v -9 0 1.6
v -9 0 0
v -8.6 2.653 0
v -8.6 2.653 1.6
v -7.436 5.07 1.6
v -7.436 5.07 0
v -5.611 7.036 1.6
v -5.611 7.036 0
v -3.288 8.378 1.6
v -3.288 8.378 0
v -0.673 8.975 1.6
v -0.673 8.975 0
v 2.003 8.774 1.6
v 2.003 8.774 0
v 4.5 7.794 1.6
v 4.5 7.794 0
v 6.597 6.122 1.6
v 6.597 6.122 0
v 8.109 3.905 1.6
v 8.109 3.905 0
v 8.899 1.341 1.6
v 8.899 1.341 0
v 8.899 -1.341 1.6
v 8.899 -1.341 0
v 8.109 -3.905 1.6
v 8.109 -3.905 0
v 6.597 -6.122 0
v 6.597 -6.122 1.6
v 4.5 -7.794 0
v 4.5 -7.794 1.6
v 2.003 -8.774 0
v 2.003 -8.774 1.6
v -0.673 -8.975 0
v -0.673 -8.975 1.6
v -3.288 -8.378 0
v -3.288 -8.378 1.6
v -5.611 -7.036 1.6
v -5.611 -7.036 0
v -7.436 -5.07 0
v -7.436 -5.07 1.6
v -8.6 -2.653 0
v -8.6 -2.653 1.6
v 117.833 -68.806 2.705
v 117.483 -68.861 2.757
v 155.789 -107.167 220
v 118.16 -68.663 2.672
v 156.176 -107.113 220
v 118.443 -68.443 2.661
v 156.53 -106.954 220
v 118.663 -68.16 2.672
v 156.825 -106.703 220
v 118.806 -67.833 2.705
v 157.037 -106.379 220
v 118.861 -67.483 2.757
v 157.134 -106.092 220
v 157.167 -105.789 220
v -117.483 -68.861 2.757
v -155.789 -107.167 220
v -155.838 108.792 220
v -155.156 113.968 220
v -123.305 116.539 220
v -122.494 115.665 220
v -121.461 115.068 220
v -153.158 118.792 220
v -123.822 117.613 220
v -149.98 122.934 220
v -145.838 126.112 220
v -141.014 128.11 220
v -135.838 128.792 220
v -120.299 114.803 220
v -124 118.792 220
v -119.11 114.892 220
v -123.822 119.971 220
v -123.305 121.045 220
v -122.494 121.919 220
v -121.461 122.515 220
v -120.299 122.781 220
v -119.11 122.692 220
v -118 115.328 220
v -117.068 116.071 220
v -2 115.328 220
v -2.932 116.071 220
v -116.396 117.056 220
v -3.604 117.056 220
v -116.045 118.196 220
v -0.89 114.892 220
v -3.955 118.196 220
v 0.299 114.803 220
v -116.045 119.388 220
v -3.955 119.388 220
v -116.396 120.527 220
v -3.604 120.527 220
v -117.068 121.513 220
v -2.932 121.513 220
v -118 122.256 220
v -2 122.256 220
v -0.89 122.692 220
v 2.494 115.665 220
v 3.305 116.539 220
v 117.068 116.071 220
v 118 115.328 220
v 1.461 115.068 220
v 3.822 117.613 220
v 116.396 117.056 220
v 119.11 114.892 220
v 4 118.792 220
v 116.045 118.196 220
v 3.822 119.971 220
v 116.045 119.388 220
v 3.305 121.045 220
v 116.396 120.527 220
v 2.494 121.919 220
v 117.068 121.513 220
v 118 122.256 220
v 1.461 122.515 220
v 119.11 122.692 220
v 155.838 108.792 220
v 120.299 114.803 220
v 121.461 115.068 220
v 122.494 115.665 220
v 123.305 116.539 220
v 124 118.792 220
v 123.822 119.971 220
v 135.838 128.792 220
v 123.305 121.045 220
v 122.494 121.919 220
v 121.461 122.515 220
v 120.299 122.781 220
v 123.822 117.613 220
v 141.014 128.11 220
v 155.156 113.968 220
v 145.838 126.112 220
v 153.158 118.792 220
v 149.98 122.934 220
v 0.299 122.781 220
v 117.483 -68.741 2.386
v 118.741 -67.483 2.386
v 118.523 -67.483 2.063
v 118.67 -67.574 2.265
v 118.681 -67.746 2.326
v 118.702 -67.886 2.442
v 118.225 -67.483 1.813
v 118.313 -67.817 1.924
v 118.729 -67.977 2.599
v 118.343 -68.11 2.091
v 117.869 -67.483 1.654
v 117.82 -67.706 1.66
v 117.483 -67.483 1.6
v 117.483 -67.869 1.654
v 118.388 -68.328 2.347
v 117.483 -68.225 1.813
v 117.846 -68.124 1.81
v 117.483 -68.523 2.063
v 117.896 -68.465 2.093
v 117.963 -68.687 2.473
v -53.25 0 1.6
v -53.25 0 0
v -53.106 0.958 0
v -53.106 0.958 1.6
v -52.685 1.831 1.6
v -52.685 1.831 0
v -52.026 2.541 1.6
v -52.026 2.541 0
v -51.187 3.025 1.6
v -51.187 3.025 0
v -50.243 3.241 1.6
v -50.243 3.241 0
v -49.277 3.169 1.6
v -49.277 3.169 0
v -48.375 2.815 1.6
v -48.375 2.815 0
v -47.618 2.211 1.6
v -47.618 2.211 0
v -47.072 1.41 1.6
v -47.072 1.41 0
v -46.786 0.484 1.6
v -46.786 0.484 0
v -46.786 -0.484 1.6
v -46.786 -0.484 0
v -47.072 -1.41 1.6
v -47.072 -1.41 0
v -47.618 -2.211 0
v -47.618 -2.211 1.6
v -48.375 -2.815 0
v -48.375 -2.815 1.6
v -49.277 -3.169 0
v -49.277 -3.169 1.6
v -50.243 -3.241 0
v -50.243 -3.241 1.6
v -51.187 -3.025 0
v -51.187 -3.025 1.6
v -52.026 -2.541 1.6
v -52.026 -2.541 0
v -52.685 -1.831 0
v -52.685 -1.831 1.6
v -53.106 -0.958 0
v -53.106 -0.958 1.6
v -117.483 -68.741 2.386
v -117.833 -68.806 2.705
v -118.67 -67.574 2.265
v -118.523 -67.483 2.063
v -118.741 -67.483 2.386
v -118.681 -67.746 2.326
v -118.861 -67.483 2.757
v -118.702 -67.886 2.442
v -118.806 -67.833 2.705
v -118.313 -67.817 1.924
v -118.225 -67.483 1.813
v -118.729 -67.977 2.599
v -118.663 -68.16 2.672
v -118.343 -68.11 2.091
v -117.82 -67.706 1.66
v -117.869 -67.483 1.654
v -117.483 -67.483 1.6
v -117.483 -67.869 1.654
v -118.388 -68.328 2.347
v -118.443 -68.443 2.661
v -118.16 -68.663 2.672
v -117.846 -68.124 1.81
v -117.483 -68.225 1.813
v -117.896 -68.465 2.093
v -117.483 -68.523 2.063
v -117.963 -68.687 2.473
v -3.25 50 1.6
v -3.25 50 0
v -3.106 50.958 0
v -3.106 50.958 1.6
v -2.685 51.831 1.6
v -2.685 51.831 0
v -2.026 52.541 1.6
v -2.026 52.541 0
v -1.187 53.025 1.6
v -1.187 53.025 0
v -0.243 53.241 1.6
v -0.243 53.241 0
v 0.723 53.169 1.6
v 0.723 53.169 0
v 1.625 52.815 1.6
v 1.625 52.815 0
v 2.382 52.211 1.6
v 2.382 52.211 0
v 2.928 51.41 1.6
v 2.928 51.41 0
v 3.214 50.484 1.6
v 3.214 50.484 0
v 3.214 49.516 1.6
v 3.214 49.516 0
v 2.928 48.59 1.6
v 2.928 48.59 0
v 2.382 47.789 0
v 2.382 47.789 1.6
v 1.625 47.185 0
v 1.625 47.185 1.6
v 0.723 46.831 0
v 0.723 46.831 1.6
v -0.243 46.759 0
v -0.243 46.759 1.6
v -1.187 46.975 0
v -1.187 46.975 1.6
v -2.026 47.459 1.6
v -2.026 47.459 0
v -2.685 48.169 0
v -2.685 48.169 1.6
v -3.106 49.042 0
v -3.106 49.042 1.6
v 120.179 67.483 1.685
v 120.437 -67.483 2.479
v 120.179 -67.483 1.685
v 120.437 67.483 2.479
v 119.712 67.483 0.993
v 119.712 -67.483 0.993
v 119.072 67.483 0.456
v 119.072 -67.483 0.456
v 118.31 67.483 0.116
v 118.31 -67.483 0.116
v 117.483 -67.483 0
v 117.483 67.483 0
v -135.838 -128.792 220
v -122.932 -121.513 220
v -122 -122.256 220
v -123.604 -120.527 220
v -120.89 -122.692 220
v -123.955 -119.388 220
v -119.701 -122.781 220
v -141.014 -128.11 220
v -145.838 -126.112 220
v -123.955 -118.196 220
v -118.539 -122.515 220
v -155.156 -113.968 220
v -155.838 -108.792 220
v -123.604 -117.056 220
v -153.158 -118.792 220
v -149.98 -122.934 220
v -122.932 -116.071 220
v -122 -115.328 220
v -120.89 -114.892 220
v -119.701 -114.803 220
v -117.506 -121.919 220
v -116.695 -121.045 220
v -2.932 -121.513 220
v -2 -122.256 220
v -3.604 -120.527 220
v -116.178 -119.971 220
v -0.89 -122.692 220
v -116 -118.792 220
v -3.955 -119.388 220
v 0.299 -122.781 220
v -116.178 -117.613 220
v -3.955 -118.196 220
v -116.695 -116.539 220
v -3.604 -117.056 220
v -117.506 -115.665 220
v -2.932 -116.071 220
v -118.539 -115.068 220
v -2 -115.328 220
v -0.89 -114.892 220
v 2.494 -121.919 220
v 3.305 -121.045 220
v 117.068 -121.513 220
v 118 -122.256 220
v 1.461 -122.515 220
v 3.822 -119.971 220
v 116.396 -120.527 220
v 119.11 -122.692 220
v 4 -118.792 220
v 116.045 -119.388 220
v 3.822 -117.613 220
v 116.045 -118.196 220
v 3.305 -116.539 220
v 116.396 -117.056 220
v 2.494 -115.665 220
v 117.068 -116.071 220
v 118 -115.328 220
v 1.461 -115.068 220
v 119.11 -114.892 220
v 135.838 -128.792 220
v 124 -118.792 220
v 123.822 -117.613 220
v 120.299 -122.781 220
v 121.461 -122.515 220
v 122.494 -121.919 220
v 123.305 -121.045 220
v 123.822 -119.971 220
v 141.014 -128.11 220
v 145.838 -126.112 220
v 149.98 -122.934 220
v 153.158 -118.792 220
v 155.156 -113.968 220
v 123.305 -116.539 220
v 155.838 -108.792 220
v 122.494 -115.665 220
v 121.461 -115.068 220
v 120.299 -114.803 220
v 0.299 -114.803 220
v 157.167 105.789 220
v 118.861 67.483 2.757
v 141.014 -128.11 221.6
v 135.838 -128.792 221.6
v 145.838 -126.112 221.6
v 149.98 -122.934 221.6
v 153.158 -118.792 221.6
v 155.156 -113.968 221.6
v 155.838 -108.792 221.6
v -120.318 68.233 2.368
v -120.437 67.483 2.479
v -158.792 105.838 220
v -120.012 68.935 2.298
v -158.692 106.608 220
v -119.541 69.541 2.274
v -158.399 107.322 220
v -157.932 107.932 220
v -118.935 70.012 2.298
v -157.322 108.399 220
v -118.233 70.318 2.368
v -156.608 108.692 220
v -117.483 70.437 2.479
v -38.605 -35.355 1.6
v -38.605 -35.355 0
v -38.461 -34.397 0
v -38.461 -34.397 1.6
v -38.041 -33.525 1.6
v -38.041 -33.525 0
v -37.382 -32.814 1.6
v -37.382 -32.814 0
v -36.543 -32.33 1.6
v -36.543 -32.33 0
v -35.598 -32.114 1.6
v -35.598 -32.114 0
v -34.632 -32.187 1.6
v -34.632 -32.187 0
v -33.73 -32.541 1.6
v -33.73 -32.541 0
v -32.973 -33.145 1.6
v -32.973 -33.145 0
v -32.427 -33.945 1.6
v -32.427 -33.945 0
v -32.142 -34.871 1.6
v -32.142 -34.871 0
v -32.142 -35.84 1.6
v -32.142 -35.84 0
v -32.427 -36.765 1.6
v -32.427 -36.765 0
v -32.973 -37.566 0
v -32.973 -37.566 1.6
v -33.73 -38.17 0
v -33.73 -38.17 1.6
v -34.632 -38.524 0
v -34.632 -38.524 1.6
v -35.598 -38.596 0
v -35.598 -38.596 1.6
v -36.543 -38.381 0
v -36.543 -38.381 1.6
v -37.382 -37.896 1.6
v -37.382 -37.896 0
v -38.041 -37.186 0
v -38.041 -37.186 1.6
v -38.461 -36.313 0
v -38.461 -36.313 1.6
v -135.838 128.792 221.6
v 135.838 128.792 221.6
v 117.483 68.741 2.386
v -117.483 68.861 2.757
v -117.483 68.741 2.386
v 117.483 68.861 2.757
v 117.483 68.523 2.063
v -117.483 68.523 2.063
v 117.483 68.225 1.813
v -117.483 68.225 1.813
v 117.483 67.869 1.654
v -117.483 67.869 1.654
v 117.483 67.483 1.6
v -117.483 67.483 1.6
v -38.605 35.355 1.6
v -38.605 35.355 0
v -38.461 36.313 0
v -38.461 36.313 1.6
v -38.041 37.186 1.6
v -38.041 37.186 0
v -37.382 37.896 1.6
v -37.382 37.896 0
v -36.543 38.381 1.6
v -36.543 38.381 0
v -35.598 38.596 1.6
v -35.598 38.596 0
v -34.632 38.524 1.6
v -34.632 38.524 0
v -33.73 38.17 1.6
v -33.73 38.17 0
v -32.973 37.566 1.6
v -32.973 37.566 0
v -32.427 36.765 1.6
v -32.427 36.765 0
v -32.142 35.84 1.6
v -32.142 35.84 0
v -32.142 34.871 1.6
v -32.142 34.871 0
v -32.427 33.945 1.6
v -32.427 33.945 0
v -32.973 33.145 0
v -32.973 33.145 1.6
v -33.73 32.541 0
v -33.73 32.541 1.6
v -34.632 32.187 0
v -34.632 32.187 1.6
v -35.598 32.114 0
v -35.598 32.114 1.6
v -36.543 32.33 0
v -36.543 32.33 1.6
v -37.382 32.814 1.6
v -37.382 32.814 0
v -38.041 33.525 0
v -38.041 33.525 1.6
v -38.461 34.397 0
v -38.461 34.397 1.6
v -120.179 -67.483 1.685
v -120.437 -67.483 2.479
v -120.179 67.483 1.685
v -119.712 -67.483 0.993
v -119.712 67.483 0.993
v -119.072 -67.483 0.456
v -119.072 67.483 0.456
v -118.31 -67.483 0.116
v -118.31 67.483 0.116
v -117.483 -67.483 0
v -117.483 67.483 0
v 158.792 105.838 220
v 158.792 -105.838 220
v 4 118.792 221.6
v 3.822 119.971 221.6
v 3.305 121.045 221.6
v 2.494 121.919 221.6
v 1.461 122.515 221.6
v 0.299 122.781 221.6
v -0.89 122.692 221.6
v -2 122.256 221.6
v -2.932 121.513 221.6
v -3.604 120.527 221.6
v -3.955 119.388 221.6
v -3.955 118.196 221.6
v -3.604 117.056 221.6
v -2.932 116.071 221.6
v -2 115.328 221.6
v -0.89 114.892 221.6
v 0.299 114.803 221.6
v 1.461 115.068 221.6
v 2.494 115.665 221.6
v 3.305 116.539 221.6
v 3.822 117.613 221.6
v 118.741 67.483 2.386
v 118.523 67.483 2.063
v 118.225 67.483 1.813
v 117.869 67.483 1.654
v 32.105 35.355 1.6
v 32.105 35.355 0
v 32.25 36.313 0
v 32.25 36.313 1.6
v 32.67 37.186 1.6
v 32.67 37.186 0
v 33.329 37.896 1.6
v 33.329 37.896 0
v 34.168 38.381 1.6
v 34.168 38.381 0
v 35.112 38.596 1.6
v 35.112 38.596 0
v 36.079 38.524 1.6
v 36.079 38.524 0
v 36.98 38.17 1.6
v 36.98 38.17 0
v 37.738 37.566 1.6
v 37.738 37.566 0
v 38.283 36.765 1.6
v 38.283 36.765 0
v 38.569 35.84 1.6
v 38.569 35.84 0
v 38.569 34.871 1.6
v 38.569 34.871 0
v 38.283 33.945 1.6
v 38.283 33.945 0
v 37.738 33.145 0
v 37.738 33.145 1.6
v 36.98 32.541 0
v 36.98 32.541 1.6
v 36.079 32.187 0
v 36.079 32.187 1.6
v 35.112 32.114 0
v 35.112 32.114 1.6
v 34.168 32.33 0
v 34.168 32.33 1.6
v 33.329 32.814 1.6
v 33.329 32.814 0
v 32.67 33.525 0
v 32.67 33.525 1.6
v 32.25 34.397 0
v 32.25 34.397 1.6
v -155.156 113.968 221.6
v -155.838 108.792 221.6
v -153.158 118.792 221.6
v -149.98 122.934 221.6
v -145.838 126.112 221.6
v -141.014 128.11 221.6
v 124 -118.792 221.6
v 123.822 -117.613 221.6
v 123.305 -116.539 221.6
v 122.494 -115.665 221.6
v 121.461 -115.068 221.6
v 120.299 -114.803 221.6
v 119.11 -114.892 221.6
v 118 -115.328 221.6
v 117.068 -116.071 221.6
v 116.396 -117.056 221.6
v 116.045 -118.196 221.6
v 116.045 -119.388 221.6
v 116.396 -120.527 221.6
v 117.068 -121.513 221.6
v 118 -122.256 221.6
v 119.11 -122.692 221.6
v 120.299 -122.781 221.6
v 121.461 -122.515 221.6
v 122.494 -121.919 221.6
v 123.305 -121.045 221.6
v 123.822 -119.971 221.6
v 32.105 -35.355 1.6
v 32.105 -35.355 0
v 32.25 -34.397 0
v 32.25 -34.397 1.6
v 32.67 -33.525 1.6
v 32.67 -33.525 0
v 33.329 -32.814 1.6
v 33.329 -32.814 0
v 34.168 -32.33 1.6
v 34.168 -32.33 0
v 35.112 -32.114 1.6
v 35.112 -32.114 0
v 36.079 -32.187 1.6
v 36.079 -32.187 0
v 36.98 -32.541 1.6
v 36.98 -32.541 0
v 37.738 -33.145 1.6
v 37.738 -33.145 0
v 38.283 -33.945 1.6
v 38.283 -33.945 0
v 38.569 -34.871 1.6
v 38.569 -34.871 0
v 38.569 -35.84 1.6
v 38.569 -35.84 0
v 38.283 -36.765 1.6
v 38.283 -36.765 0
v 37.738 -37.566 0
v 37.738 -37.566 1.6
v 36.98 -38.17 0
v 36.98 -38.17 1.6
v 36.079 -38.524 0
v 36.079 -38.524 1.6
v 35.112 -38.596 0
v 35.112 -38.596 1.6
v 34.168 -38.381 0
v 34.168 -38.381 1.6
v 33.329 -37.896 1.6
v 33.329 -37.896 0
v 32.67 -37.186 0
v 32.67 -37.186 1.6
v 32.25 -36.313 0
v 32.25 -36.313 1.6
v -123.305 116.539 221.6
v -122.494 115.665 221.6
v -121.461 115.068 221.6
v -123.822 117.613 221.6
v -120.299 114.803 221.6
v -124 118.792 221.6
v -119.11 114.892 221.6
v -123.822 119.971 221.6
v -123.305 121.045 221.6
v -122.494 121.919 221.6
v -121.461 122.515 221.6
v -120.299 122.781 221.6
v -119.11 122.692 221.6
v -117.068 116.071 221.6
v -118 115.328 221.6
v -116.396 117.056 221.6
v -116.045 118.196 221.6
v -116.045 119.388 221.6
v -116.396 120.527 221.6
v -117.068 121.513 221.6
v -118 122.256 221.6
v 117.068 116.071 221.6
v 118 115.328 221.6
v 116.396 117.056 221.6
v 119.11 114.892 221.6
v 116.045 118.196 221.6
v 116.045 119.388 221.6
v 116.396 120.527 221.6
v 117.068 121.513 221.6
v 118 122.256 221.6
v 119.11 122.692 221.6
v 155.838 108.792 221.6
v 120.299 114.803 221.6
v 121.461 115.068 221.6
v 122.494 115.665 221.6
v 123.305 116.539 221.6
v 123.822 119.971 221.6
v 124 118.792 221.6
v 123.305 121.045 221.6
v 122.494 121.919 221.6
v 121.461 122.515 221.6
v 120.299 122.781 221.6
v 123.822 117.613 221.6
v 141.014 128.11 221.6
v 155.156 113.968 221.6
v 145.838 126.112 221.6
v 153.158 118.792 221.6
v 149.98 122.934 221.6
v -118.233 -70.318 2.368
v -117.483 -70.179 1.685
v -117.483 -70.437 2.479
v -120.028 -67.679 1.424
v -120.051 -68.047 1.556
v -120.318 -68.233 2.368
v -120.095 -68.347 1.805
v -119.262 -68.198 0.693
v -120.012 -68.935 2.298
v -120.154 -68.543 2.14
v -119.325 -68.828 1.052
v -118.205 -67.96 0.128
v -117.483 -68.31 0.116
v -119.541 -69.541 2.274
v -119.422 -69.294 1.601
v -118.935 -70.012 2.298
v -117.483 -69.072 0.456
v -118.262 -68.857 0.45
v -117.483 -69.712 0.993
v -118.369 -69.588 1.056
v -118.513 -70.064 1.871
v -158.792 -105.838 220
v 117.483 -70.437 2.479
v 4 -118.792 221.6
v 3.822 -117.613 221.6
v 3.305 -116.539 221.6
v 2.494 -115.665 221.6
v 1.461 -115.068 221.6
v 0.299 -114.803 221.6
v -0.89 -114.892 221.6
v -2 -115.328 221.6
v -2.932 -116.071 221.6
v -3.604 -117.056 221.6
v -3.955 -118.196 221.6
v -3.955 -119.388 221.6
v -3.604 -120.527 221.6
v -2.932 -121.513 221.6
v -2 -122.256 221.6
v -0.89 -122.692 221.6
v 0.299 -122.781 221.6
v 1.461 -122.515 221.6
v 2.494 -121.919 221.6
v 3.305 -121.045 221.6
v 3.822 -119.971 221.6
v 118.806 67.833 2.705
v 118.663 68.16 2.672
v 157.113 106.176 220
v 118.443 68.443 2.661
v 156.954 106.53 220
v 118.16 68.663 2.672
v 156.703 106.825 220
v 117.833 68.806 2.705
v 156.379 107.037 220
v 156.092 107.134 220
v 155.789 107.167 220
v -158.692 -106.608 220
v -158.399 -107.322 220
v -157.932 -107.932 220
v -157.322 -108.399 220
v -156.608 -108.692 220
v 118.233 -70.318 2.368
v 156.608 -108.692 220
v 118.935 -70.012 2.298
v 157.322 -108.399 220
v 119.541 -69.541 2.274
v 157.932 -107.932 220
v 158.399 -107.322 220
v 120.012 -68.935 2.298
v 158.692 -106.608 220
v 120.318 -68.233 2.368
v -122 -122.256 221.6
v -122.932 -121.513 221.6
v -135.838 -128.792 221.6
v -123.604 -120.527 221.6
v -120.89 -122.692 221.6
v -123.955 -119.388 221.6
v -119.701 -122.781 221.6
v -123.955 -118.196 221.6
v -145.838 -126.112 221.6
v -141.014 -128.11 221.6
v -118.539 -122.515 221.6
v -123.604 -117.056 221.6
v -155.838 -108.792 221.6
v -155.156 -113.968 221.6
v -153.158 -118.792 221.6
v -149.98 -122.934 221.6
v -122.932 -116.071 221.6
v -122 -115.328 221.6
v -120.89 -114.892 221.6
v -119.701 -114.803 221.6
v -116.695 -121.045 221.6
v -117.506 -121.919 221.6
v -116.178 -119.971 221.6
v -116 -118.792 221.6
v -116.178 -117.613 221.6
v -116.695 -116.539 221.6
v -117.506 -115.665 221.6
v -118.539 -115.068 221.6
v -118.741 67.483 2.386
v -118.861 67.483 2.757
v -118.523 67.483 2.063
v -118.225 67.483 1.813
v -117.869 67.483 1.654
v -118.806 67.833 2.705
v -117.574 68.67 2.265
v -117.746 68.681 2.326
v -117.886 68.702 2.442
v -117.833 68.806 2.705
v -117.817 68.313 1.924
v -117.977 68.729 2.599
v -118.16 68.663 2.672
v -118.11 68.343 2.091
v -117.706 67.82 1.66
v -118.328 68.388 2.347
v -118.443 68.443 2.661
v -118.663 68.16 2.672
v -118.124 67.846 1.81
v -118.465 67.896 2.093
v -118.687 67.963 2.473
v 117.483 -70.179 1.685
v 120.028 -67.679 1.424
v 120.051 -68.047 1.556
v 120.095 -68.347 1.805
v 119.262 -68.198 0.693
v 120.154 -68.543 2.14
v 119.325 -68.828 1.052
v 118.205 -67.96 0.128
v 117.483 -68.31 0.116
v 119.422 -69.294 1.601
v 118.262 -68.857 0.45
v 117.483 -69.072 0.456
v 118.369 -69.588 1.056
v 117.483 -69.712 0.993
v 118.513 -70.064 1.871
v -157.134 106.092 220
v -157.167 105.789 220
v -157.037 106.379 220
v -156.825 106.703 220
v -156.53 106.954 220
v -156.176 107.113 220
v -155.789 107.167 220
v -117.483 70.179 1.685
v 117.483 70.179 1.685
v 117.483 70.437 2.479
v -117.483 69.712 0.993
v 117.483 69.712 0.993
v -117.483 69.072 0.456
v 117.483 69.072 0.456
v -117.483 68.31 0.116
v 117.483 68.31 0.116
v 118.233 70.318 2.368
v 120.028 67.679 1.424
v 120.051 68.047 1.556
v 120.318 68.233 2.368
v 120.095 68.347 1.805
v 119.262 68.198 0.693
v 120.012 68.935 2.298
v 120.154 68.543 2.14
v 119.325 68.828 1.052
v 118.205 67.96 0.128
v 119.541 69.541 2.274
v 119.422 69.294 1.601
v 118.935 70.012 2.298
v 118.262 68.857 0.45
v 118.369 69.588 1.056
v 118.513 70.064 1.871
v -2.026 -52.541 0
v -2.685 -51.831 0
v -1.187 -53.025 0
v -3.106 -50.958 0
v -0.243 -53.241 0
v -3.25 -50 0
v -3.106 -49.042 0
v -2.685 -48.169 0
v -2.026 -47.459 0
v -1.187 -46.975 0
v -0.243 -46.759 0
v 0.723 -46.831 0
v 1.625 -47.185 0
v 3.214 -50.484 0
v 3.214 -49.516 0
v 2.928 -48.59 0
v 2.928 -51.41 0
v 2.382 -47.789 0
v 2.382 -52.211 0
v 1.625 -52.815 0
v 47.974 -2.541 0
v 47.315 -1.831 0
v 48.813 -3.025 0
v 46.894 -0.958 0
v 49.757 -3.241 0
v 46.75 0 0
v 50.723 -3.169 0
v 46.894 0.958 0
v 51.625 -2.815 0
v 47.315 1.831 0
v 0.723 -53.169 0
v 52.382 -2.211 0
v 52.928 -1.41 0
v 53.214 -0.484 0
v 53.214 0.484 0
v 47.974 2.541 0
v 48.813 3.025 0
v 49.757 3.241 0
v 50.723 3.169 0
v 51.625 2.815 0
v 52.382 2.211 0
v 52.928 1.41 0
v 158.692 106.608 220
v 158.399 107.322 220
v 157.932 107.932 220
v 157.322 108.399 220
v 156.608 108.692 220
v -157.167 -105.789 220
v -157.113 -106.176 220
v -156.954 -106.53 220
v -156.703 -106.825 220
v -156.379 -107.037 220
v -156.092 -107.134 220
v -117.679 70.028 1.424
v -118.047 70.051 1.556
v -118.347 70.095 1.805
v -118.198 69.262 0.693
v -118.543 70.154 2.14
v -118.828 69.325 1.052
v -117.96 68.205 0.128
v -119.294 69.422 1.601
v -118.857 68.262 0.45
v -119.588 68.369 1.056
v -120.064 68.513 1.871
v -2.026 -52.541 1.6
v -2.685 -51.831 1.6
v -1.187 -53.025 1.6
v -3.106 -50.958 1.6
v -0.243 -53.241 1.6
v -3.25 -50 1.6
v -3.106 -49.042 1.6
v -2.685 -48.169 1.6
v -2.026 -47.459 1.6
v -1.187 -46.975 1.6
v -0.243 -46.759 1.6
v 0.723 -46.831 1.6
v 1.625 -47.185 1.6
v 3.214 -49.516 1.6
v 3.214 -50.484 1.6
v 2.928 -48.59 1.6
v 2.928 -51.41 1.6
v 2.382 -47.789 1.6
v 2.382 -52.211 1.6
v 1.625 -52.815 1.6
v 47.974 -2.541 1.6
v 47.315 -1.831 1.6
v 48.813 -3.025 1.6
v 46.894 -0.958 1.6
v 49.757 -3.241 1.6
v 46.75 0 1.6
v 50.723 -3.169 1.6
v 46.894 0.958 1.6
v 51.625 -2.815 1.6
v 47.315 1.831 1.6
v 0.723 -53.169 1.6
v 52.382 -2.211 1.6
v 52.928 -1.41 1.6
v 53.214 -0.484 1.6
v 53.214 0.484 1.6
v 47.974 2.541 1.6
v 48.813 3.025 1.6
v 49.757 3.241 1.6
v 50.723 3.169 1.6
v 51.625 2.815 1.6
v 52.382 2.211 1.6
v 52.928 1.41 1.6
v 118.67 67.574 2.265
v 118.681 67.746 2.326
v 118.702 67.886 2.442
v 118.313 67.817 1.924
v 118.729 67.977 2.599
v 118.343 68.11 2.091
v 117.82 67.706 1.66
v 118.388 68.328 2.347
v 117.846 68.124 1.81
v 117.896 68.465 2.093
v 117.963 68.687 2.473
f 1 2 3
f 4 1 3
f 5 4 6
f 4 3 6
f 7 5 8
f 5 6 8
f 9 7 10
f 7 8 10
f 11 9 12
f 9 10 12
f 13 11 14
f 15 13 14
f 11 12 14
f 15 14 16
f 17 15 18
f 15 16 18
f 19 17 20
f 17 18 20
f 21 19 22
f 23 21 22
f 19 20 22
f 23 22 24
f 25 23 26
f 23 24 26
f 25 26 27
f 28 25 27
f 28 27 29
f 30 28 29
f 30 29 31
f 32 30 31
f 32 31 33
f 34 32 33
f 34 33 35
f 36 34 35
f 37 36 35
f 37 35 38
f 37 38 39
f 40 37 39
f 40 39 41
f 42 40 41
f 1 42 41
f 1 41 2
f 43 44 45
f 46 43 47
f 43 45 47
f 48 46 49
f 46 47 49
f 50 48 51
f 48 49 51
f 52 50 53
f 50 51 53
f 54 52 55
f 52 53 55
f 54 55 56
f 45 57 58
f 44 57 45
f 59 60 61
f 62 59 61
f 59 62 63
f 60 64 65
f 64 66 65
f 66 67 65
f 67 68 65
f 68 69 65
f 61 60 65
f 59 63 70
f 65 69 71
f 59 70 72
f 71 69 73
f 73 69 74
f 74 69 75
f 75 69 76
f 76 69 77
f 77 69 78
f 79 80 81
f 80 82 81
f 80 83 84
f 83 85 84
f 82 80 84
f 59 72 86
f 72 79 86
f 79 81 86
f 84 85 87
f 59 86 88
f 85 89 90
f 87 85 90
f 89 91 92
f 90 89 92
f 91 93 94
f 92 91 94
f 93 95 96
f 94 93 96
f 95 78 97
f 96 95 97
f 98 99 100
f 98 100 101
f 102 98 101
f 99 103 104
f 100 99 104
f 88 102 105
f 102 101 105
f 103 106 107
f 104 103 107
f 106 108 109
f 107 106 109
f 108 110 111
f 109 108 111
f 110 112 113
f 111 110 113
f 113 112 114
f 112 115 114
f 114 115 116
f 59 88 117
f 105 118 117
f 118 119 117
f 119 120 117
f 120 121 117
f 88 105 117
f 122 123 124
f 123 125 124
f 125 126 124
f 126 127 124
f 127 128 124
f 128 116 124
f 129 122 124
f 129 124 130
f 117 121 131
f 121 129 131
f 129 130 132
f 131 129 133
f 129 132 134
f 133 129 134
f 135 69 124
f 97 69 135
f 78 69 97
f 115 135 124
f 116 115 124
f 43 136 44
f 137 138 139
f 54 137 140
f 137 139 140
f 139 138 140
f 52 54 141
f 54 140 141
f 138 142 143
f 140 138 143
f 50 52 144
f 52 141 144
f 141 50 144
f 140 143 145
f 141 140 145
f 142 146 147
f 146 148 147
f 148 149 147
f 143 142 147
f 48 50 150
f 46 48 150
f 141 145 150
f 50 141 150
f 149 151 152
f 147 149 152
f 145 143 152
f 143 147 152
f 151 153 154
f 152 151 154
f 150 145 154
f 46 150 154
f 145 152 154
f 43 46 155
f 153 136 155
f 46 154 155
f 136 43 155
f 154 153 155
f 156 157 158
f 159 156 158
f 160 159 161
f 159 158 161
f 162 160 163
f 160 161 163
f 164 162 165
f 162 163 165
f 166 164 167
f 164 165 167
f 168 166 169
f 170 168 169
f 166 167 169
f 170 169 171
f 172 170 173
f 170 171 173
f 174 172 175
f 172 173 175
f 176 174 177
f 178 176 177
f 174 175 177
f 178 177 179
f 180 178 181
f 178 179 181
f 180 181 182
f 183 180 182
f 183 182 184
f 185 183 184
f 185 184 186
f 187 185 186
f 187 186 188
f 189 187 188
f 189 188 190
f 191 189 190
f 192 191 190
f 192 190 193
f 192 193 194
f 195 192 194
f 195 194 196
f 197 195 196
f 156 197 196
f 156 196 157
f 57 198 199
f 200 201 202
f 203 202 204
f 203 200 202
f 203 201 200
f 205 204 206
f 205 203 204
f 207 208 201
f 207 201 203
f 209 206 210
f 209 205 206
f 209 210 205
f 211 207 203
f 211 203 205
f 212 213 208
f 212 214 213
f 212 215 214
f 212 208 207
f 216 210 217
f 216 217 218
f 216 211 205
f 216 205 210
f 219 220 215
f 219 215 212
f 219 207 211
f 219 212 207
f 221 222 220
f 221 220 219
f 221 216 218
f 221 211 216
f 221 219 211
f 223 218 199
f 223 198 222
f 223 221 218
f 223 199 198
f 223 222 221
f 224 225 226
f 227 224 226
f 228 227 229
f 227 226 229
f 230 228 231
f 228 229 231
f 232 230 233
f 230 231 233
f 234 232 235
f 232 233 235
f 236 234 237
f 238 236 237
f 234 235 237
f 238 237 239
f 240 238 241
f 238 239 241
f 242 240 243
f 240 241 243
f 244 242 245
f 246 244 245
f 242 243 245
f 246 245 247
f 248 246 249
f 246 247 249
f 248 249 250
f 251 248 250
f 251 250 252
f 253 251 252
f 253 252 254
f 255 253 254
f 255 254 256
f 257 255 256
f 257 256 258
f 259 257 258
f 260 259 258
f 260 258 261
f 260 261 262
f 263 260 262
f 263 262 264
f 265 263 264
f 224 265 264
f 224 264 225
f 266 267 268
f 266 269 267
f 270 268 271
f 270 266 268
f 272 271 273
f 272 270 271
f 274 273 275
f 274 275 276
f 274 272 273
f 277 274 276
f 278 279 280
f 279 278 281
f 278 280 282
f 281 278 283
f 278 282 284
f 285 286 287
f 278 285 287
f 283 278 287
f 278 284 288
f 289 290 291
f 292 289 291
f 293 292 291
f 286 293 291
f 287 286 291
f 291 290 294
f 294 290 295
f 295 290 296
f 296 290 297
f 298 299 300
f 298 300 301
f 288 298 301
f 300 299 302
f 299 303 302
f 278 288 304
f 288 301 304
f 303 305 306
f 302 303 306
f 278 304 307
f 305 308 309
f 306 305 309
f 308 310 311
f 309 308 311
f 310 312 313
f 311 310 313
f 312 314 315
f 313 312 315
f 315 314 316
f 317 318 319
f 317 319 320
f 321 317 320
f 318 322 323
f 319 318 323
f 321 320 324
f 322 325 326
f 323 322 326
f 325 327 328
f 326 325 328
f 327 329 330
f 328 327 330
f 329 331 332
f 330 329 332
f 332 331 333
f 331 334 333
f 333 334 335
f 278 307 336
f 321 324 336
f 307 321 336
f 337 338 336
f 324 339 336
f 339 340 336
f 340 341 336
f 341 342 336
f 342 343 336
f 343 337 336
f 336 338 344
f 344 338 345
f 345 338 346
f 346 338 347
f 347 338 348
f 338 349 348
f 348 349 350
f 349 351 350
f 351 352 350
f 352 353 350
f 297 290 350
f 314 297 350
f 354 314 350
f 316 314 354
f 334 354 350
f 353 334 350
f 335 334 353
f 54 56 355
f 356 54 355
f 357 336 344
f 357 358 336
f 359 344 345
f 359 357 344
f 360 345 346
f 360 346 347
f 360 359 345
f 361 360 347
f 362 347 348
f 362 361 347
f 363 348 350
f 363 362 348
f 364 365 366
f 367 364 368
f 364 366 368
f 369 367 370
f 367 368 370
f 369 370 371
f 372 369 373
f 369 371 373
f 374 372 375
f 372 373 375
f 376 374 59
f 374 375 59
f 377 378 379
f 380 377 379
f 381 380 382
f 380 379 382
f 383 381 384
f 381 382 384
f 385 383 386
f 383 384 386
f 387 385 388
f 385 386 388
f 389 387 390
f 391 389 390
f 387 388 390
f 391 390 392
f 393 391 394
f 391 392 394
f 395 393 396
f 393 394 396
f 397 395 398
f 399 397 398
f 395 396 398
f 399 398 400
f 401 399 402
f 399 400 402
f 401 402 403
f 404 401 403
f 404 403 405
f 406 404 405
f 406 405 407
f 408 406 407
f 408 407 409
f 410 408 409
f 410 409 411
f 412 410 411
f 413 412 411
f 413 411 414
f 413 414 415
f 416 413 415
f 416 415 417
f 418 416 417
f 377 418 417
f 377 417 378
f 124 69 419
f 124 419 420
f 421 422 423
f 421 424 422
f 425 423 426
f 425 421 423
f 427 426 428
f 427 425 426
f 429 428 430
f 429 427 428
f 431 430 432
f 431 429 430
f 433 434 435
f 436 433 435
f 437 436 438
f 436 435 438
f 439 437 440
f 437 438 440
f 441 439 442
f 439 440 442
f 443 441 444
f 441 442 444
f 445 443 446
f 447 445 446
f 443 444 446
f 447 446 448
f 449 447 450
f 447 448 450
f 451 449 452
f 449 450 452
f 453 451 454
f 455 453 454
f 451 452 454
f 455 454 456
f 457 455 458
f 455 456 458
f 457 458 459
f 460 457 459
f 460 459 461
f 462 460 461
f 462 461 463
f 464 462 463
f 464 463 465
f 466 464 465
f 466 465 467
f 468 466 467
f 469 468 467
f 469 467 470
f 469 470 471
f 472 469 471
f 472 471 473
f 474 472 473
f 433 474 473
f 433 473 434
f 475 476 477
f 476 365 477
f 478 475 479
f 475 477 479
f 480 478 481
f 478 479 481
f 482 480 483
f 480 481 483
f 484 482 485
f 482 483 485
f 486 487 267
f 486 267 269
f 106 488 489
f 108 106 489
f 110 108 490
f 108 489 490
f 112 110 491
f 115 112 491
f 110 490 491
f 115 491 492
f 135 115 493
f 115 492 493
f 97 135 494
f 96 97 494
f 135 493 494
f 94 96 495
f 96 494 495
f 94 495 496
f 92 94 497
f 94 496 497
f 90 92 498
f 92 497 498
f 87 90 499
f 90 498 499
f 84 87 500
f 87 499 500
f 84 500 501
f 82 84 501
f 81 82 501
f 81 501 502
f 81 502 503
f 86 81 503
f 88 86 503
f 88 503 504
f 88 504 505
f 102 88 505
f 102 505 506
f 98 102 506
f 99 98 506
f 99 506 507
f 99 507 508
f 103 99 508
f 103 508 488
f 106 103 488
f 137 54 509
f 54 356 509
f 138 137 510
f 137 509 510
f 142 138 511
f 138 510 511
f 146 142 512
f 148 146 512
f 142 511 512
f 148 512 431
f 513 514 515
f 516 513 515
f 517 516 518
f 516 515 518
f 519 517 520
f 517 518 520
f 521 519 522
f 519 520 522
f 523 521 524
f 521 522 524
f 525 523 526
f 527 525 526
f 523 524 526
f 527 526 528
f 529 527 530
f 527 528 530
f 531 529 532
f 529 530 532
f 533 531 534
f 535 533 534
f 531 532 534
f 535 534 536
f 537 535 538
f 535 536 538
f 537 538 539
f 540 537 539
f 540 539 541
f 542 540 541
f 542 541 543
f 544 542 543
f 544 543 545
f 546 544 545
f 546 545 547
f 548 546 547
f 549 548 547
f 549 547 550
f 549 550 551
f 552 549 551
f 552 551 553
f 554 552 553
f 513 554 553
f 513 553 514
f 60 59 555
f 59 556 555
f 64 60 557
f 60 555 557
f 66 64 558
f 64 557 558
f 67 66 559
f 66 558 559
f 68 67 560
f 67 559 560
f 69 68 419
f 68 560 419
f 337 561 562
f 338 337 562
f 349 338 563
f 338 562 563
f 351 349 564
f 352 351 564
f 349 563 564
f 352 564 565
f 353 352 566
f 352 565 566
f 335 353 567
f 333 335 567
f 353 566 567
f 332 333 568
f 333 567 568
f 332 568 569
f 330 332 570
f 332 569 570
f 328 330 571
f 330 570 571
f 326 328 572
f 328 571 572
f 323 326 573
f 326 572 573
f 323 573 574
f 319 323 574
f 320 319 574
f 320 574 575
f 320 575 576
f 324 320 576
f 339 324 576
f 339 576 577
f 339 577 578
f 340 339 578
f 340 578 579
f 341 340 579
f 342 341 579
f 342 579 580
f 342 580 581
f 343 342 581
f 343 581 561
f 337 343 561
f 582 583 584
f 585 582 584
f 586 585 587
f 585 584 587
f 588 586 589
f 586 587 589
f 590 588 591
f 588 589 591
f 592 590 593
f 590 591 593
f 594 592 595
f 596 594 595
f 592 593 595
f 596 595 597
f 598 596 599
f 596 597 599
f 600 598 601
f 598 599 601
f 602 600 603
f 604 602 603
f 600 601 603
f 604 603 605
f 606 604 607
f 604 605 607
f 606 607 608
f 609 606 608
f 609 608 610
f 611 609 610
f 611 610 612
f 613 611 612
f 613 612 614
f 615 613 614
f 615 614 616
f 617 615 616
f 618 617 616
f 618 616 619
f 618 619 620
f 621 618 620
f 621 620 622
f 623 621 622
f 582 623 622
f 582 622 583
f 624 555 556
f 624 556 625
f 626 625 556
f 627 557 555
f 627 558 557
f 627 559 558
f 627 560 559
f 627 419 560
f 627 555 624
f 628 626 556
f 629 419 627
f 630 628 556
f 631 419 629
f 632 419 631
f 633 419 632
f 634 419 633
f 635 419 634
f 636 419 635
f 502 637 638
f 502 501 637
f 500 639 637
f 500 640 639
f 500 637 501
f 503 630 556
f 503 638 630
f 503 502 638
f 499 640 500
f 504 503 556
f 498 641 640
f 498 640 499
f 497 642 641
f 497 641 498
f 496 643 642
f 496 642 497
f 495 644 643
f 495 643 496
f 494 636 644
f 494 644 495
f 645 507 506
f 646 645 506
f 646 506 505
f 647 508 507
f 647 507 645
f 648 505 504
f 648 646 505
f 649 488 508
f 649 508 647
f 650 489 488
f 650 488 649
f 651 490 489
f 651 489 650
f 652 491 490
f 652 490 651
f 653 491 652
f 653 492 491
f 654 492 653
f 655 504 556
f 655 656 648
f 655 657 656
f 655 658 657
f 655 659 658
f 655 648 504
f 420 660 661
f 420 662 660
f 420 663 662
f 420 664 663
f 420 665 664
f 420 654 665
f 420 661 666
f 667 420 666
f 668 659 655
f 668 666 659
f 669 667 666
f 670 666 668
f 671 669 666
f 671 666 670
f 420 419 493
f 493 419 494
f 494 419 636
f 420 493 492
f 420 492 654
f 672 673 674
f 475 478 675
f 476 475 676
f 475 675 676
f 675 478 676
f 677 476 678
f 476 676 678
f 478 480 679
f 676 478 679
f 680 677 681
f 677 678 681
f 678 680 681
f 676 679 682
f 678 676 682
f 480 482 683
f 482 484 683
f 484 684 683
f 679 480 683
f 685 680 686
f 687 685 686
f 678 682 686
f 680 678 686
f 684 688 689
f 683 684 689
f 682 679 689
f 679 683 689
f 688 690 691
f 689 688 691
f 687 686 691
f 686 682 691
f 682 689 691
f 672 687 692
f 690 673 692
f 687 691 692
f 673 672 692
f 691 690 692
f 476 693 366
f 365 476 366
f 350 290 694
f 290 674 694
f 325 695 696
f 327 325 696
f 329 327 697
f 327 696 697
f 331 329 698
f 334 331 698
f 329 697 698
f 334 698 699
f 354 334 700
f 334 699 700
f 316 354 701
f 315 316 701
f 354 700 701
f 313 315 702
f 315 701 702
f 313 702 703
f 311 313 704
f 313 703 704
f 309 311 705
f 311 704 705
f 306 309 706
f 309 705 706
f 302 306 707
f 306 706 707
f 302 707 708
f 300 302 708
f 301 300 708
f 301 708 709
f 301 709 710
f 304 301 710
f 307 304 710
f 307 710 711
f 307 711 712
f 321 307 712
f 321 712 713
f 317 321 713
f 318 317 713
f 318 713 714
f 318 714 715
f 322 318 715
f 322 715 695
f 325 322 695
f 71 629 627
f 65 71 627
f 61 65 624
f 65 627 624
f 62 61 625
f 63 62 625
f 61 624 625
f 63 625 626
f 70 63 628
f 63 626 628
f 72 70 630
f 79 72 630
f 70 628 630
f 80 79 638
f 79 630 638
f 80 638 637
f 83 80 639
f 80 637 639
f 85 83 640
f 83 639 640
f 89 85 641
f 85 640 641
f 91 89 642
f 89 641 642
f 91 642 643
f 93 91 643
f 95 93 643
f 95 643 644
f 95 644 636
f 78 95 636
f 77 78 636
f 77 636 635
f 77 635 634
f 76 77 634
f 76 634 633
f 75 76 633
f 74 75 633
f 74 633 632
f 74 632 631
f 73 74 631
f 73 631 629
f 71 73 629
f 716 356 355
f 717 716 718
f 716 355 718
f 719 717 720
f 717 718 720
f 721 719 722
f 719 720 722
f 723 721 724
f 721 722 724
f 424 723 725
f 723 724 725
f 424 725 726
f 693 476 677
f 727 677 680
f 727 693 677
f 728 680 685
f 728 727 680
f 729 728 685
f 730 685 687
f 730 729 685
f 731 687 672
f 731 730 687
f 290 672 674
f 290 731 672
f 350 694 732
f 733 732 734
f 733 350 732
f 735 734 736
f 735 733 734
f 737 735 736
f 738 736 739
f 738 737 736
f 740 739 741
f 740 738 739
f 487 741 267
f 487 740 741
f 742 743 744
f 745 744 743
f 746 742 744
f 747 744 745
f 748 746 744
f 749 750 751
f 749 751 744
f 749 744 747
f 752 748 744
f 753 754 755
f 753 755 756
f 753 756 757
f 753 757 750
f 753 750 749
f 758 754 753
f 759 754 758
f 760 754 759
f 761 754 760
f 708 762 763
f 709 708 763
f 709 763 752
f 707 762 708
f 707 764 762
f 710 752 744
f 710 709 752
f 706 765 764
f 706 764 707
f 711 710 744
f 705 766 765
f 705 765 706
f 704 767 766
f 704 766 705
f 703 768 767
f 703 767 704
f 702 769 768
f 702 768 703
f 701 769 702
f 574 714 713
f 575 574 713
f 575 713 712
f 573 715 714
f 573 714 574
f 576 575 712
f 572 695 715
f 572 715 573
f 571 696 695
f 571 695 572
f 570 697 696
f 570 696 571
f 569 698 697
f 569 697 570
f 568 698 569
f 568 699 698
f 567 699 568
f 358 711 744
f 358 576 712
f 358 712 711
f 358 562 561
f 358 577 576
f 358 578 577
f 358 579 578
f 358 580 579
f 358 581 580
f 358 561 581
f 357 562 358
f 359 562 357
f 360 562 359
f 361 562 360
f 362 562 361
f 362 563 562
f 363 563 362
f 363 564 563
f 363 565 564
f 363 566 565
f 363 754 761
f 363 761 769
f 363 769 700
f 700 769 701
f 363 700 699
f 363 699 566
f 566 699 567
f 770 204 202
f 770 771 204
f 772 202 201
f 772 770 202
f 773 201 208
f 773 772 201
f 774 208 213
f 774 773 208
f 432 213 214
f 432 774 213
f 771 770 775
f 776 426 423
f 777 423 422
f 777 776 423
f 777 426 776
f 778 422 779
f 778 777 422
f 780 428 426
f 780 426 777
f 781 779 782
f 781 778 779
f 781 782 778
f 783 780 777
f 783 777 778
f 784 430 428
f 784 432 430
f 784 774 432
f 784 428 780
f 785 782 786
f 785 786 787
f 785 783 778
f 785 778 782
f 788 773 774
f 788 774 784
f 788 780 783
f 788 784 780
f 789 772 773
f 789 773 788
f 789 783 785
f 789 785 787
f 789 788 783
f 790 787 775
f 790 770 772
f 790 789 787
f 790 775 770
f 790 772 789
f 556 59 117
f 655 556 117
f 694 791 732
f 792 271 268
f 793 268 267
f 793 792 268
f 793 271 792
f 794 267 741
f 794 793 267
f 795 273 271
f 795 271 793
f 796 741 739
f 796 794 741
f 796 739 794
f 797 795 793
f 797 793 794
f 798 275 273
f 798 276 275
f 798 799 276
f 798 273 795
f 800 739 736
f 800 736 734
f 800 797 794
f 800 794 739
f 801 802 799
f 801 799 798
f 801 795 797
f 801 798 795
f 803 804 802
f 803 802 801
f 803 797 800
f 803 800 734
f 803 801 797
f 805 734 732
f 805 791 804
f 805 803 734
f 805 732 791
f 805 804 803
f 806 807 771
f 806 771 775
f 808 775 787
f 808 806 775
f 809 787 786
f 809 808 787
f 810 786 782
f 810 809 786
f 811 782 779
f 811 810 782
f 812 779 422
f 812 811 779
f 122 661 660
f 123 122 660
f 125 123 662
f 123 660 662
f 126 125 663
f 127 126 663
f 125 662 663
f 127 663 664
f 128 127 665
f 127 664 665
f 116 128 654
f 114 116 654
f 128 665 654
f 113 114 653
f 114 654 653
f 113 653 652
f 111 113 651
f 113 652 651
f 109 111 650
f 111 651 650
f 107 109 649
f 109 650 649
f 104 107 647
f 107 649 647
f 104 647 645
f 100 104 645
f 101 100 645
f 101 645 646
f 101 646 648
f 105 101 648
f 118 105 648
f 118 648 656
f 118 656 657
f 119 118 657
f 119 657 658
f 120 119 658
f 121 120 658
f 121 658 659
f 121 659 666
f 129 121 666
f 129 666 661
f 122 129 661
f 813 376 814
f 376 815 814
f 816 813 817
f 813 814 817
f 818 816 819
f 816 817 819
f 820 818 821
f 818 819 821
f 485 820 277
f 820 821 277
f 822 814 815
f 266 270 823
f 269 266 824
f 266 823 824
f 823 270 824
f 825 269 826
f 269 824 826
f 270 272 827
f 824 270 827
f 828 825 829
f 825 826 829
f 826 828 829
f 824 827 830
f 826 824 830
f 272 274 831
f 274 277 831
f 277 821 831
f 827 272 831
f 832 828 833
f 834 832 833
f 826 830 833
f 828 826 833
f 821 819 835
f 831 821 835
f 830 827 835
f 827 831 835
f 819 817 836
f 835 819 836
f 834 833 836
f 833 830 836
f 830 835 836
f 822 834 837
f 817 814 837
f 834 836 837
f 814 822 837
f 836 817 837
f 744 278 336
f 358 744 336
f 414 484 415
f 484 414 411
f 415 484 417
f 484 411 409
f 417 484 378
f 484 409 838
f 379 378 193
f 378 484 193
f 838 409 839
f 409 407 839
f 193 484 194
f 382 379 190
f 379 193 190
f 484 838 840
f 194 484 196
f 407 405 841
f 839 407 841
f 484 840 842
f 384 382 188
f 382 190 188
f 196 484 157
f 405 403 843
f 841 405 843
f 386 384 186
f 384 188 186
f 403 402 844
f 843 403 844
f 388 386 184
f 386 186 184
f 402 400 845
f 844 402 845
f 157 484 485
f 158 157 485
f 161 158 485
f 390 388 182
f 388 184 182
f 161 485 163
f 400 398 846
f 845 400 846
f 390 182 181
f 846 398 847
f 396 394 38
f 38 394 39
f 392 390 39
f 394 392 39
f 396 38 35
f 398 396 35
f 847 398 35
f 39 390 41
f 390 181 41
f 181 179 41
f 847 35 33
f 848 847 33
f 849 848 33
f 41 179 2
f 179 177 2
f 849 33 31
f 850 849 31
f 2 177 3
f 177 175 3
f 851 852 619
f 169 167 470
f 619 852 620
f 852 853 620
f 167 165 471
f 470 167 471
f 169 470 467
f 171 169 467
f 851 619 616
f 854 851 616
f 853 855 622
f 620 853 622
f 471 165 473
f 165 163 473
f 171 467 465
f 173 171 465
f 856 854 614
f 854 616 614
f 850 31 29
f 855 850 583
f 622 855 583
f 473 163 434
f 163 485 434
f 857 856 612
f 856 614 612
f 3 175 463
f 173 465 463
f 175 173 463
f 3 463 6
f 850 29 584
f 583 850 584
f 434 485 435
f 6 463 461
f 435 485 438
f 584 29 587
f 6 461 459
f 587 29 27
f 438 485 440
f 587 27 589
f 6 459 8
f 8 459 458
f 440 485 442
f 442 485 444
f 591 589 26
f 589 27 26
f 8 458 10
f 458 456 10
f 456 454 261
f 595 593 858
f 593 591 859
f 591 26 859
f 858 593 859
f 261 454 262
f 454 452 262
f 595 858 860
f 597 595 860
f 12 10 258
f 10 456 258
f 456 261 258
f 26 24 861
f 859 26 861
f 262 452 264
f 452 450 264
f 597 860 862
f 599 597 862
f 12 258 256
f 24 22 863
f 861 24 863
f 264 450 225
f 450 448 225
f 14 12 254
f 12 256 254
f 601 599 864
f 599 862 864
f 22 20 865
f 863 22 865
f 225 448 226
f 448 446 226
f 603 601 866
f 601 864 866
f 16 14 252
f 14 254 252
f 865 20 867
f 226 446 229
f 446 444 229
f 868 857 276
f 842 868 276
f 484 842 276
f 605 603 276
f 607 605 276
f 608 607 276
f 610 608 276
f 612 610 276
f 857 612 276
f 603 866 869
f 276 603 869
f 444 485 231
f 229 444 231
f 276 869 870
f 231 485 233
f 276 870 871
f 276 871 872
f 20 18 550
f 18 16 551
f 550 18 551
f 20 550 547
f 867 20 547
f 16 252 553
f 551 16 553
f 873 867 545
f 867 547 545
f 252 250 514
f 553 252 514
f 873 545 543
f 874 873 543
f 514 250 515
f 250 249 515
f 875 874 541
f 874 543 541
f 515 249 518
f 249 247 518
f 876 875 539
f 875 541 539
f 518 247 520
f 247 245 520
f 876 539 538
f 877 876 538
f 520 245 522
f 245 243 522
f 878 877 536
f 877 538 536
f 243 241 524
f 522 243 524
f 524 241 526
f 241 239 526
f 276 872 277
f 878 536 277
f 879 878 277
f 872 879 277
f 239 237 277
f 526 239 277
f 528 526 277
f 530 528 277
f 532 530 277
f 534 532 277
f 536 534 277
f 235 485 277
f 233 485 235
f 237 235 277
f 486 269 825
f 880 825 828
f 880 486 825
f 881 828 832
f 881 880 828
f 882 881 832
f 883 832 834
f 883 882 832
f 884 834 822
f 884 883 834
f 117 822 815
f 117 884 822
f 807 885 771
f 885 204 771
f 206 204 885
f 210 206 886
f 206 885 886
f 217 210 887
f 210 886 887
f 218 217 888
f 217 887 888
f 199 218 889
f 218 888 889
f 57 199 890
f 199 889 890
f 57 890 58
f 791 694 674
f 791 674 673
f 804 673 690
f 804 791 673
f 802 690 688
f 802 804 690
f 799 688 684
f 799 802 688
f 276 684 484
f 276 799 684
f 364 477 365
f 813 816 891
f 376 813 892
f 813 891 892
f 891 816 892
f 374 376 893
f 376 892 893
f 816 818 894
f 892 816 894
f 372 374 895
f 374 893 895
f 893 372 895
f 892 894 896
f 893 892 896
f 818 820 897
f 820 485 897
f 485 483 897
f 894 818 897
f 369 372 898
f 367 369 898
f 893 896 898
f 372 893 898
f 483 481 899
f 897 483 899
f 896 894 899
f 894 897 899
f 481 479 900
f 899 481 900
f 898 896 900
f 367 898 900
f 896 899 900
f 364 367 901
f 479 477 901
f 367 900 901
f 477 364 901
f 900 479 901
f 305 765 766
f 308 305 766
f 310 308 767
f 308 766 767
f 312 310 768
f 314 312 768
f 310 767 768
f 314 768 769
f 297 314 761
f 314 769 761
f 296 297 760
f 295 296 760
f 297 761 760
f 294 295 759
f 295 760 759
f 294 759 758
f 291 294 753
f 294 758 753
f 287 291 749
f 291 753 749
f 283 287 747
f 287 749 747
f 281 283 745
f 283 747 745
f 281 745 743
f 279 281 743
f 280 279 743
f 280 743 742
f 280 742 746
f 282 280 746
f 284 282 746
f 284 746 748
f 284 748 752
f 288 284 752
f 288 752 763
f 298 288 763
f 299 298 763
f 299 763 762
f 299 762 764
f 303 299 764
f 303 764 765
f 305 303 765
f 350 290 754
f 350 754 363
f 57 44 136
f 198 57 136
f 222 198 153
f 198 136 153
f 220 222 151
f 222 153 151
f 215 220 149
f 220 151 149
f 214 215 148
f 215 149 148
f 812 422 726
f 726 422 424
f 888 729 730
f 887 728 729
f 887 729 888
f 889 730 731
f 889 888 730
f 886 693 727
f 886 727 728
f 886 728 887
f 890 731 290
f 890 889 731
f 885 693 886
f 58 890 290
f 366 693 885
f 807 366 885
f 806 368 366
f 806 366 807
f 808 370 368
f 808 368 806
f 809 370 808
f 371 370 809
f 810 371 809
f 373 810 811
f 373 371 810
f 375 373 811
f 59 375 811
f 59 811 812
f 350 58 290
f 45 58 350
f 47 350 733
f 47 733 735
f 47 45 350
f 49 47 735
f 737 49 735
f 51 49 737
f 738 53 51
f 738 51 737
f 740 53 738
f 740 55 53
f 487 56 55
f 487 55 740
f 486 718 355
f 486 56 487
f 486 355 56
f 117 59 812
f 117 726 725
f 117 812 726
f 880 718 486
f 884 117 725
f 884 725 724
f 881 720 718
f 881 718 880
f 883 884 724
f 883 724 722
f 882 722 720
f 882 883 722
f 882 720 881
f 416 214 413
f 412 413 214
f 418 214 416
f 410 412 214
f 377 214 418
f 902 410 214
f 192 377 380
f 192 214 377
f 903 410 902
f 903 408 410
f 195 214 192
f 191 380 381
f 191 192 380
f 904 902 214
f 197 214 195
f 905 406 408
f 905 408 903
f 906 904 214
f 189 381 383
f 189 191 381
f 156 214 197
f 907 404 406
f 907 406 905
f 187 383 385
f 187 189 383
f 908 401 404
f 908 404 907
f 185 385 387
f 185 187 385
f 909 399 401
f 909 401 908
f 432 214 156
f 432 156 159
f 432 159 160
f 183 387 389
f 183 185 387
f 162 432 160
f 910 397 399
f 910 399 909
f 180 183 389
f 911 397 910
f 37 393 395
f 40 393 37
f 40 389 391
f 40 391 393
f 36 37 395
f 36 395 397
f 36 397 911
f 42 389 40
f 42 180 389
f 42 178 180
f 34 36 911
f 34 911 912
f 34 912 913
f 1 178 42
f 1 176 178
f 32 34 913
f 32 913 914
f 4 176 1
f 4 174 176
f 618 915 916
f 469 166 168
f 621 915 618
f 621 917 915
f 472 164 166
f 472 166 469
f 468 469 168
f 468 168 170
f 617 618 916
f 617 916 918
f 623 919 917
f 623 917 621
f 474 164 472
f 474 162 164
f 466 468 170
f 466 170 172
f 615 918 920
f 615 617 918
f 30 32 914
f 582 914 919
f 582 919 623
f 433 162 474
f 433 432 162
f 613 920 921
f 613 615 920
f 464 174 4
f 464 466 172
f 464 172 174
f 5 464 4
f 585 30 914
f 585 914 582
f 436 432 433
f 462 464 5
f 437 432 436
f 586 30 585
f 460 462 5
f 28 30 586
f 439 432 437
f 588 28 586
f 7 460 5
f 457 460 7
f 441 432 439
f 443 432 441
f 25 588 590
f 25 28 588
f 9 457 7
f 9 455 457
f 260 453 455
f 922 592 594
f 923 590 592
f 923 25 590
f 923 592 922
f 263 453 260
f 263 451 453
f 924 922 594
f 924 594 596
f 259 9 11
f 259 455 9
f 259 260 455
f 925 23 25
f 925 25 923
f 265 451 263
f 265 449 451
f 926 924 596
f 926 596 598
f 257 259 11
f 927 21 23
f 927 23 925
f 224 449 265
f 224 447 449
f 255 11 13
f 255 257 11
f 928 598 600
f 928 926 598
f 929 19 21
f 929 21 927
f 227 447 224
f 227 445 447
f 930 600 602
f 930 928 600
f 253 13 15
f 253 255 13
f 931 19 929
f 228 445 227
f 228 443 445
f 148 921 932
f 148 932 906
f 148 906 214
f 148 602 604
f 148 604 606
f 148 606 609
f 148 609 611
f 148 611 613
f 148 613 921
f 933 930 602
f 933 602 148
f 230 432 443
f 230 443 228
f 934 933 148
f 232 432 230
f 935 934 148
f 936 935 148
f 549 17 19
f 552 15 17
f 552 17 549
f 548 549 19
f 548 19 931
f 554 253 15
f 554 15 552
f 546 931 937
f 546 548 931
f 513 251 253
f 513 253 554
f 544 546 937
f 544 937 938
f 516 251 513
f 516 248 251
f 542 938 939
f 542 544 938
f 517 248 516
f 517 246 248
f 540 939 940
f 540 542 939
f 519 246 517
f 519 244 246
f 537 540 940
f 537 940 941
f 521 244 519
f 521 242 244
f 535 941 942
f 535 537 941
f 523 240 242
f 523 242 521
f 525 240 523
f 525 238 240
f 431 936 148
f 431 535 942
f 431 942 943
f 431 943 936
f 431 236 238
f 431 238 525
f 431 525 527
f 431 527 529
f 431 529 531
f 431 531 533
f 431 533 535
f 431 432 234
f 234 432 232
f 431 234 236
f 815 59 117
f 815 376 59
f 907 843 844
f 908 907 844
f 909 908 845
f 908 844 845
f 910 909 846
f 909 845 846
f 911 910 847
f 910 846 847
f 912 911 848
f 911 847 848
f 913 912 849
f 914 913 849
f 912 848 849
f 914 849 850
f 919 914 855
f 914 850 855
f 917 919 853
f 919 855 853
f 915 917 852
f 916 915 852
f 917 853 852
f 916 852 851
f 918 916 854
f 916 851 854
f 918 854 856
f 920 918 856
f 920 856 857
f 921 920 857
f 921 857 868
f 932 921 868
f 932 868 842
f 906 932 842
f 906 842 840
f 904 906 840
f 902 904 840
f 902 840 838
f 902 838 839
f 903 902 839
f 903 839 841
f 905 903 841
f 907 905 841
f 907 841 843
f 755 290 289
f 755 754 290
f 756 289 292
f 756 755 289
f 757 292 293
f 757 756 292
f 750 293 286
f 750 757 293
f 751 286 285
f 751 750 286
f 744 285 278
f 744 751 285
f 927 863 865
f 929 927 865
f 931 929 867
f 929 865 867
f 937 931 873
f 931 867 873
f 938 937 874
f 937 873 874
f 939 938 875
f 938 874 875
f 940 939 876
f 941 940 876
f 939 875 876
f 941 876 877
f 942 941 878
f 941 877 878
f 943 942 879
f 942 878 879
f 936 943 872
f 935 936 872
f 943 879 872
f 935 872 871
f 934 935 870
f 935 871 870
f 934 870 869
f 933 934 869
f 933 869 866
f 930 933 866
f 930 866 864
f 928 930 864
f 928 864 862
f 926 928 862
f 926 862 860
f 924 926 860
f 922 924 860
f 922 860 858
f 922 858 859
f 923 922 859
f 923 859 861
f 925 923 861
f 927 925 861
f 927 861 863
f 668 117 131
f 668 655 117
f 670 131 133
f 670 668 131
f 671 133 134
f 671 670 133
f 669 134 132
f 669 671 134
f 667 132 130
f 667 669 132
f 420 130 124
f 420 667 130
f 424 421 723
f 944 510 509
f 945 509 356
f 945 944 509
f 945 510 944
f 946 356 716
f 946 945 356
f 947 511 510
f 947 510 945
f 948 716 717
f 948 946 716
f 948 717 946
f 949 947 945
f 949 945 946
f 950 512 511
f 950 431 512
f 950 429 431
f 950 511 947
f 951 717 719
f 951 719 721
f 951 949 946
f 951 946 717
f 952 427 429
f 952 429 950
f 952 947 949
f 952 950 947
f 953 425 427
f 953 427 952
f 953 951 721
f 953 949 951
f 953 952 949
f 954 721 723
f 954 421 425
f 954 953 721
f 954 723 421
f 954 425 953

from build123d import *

# Parameters (mm, degrees)
CROQUIS1_W                = 240
CROQUIS1_H                = 140
SALIENTE_EXTRUIR1_DEPTH   = 220
SALIENTE_EXTRUIR1_DRAFT   = -10
REDONDEO1_R               = 3
VACIADO1_T                = -1.6
CROQUIS2_W                = 311.675024994
CROQUIS2_H                = 20
SALIENTE_EXTRUIR2_DEPTH   = 1.6
SALIENTE_EXTRUIR2_2_DEPTH = 1.6
REDONDEO2_R               = 20
REDONDEO3_R               = 20
CROQUIS3_R                = 4
CORTAR_EXTRUIR1_DEPTH     = 302.510864774
CROQUIS4_R                = 9
CROQUIS4_R_2              = 3.25
CORTAR_EXTRUIR2_DEPTH     = 302.510864774


with BuildPart() as part:
    # Croquis1 → Saliente-Extruir1 (with draft: the straight prism first)
    with BuildSketch(Plane.XY):
        Rectangle(CROQUIS1_W, CROQUIS1_H)
    extrude(amount=SALIENTE_EXTRUIR1_DEPTH)
    # Saliente-Extruir1: the draft: its side faces are tilted about the plane it starts from
    saliente_extruir1_sides = [part.faces().sort_by_distance(p)[0] for p in [
        (-120, 0, 110),
        (0, -70, 110),
        (120, 0, 110),
        (0, 70, 110),
    ]]
    draft(saliente_extruir1_sides, Plane.XY, SALIENTE_EXTRUIR1_DRAFT)

    # Redondeo1
    redondeo1_edges = [part.edges().sort_by_distance(p)[0] for p in [
        (0, -70, 0),
        (-120, 0, 0),
        (0, 70, 0),
        (120, 0, 0),
        (139.395967878, -89.395967878, 110),
        (-139.395967878, -89.395967878, 110),
        (-139.395967878, 89.395967878, 110),
        (139.395967878, 89.395967878, 110),
    ]]
    fillet(redondeo1_edges, radius=REDONDEO1_R)

    # Vaciado1
    vaciado1_openings = [part.faces().sort_by_distance(p)[0] for p in [
        (0, 0, 220),
    ]]
    offset(amount=VACIADO1_T, openings=vaciado1_openings, kind=Kind.INTERSECTION)

    # Croquis4 → Cortar-Extruir2 (cut, through all)
    with BuildSketch(Plane(origin=(0, 0, 0), x_dir=(-1, 0, 0), z_dir=(0, 0, -1))):
        Circle(CROQUIS4_R)
        with Locations((50, 0)):
            Circle(CROQUIS4_R_2)
        with Locations((35.355339059, -35.355339059)):
            Circle(CROQUIS4_R_2)
        with Locations((0, -50)):
            Circle(CROQUIS4_R_2)
        with Locations((-35.355339059, -35.355339059)):
            Circle(CROQUIS4_R_2)
        with Locations((-50, 0)):
            Circle(CROQUIS4_R_2)
        with Locations((-35.355339059, 35.355339059)):
            Circle(CROQUIS4_R_2)
        with Locations((0, 50)):
            Circle(CROQUIS4_R_2)
        with Locations((35.355339059, 35.355339059)):
            Circle(CROQUIS4_R_2)
    extrude(amount=-CORTAR_EXTRUIR2_DEPTH, mode=Mode.SUBTRACT)


with BuildPart() as body_2:
    # Croquis2 → Saliente-Extruir2 (new body)
    with BuildSketch(Plane.XY.offset(220)):
        with Locations((0, 118.791935756)):
            Rectangle(CROQUIS2_W, CROQUIS2_H)
    extrude(amount=SALIENTE_EXTRUIR2_DEPTH)

    # Redondeo2
    redondeo2_edges = [body_2.edges().sort_by_distance(p)[0] for p in [
        (-155.837512497, 128.791935756, 220.8),
        (155.837512497, 128.791935756, 220.8),
    ]]
    fillet(redondeo2_edges, radius=REDONDEO2_R - 0.0001)  # a hair under: the kernel refuses the full size


with BuildPart() as body_3:
    # Croquis2 → Saliente-Extruir2 2 (new body)
    with BuildSketch(Plane.XY.offset(220)):
        with Locations((0, -118.791935756)):
            Rectangle(CROQUIS2_W, CROQUIS2_H)
    extrude(amount=SALIENTE_EXTRUIR2_2_DEPTH)

    # Redondeo3
    redondeo3_edges = [body_3.edges().sort_by_distance(p)[0] for p in [
        (-155.837512497, -128.791935756, 220.8),
        (155.837512497, -128.791935756, 220.8),
    ]]
    fillet(redondeo3_edges, radius=REDONDEO3_R - 0.0001)  # a hair under: the kernel refuses the full size


with BuildPart() as cortar_extruir1_tool:
    # Croquis3 → Cortar-Extruir1 (new, through all)
    with BuildSketch(Plane.XY.offset(221.6)):
        with Locations((0, 118.791935756)):
            Circle(CROQUIS3_R)
        with Locations((120, 118.791935756)):
            Circle(CROQUIS3_R)
        with Locations(Location((-120, 118.791935756, 0), (0, 0, 180))):
            Circle(CROQUIS3_R)
        with Locations((120, -118.791935756)):
            Circle(CROQUIS3_R)
        with Locations((0, -118.791935756)):
            Circle(CROQUIS3_R)
        with Locations((-120, -118.791935756)):
            Circle(CROQUIS3_R)
    extrude(amount=-CORTAR_EXTRUIR1_DEPTH)


with BuildPart() as body_2_1:
    add(body_2.part)

    # Cortar-Extruir1: cut by cortar_extruir1_tool
    add(cortar_extruir1_tool.part, mode=Mode.SUBTRACT)


with BuildPart() as body_3_1:
    add(body_3.part)

    # Cortar-Extruir1: cut by cortar_extruir1_tool
    add(cortar_extruir1_tool.part, mode=Mode.SUBTRACT)


solid = Compound([part.part, body_2_1.part, body_3_1.part])
